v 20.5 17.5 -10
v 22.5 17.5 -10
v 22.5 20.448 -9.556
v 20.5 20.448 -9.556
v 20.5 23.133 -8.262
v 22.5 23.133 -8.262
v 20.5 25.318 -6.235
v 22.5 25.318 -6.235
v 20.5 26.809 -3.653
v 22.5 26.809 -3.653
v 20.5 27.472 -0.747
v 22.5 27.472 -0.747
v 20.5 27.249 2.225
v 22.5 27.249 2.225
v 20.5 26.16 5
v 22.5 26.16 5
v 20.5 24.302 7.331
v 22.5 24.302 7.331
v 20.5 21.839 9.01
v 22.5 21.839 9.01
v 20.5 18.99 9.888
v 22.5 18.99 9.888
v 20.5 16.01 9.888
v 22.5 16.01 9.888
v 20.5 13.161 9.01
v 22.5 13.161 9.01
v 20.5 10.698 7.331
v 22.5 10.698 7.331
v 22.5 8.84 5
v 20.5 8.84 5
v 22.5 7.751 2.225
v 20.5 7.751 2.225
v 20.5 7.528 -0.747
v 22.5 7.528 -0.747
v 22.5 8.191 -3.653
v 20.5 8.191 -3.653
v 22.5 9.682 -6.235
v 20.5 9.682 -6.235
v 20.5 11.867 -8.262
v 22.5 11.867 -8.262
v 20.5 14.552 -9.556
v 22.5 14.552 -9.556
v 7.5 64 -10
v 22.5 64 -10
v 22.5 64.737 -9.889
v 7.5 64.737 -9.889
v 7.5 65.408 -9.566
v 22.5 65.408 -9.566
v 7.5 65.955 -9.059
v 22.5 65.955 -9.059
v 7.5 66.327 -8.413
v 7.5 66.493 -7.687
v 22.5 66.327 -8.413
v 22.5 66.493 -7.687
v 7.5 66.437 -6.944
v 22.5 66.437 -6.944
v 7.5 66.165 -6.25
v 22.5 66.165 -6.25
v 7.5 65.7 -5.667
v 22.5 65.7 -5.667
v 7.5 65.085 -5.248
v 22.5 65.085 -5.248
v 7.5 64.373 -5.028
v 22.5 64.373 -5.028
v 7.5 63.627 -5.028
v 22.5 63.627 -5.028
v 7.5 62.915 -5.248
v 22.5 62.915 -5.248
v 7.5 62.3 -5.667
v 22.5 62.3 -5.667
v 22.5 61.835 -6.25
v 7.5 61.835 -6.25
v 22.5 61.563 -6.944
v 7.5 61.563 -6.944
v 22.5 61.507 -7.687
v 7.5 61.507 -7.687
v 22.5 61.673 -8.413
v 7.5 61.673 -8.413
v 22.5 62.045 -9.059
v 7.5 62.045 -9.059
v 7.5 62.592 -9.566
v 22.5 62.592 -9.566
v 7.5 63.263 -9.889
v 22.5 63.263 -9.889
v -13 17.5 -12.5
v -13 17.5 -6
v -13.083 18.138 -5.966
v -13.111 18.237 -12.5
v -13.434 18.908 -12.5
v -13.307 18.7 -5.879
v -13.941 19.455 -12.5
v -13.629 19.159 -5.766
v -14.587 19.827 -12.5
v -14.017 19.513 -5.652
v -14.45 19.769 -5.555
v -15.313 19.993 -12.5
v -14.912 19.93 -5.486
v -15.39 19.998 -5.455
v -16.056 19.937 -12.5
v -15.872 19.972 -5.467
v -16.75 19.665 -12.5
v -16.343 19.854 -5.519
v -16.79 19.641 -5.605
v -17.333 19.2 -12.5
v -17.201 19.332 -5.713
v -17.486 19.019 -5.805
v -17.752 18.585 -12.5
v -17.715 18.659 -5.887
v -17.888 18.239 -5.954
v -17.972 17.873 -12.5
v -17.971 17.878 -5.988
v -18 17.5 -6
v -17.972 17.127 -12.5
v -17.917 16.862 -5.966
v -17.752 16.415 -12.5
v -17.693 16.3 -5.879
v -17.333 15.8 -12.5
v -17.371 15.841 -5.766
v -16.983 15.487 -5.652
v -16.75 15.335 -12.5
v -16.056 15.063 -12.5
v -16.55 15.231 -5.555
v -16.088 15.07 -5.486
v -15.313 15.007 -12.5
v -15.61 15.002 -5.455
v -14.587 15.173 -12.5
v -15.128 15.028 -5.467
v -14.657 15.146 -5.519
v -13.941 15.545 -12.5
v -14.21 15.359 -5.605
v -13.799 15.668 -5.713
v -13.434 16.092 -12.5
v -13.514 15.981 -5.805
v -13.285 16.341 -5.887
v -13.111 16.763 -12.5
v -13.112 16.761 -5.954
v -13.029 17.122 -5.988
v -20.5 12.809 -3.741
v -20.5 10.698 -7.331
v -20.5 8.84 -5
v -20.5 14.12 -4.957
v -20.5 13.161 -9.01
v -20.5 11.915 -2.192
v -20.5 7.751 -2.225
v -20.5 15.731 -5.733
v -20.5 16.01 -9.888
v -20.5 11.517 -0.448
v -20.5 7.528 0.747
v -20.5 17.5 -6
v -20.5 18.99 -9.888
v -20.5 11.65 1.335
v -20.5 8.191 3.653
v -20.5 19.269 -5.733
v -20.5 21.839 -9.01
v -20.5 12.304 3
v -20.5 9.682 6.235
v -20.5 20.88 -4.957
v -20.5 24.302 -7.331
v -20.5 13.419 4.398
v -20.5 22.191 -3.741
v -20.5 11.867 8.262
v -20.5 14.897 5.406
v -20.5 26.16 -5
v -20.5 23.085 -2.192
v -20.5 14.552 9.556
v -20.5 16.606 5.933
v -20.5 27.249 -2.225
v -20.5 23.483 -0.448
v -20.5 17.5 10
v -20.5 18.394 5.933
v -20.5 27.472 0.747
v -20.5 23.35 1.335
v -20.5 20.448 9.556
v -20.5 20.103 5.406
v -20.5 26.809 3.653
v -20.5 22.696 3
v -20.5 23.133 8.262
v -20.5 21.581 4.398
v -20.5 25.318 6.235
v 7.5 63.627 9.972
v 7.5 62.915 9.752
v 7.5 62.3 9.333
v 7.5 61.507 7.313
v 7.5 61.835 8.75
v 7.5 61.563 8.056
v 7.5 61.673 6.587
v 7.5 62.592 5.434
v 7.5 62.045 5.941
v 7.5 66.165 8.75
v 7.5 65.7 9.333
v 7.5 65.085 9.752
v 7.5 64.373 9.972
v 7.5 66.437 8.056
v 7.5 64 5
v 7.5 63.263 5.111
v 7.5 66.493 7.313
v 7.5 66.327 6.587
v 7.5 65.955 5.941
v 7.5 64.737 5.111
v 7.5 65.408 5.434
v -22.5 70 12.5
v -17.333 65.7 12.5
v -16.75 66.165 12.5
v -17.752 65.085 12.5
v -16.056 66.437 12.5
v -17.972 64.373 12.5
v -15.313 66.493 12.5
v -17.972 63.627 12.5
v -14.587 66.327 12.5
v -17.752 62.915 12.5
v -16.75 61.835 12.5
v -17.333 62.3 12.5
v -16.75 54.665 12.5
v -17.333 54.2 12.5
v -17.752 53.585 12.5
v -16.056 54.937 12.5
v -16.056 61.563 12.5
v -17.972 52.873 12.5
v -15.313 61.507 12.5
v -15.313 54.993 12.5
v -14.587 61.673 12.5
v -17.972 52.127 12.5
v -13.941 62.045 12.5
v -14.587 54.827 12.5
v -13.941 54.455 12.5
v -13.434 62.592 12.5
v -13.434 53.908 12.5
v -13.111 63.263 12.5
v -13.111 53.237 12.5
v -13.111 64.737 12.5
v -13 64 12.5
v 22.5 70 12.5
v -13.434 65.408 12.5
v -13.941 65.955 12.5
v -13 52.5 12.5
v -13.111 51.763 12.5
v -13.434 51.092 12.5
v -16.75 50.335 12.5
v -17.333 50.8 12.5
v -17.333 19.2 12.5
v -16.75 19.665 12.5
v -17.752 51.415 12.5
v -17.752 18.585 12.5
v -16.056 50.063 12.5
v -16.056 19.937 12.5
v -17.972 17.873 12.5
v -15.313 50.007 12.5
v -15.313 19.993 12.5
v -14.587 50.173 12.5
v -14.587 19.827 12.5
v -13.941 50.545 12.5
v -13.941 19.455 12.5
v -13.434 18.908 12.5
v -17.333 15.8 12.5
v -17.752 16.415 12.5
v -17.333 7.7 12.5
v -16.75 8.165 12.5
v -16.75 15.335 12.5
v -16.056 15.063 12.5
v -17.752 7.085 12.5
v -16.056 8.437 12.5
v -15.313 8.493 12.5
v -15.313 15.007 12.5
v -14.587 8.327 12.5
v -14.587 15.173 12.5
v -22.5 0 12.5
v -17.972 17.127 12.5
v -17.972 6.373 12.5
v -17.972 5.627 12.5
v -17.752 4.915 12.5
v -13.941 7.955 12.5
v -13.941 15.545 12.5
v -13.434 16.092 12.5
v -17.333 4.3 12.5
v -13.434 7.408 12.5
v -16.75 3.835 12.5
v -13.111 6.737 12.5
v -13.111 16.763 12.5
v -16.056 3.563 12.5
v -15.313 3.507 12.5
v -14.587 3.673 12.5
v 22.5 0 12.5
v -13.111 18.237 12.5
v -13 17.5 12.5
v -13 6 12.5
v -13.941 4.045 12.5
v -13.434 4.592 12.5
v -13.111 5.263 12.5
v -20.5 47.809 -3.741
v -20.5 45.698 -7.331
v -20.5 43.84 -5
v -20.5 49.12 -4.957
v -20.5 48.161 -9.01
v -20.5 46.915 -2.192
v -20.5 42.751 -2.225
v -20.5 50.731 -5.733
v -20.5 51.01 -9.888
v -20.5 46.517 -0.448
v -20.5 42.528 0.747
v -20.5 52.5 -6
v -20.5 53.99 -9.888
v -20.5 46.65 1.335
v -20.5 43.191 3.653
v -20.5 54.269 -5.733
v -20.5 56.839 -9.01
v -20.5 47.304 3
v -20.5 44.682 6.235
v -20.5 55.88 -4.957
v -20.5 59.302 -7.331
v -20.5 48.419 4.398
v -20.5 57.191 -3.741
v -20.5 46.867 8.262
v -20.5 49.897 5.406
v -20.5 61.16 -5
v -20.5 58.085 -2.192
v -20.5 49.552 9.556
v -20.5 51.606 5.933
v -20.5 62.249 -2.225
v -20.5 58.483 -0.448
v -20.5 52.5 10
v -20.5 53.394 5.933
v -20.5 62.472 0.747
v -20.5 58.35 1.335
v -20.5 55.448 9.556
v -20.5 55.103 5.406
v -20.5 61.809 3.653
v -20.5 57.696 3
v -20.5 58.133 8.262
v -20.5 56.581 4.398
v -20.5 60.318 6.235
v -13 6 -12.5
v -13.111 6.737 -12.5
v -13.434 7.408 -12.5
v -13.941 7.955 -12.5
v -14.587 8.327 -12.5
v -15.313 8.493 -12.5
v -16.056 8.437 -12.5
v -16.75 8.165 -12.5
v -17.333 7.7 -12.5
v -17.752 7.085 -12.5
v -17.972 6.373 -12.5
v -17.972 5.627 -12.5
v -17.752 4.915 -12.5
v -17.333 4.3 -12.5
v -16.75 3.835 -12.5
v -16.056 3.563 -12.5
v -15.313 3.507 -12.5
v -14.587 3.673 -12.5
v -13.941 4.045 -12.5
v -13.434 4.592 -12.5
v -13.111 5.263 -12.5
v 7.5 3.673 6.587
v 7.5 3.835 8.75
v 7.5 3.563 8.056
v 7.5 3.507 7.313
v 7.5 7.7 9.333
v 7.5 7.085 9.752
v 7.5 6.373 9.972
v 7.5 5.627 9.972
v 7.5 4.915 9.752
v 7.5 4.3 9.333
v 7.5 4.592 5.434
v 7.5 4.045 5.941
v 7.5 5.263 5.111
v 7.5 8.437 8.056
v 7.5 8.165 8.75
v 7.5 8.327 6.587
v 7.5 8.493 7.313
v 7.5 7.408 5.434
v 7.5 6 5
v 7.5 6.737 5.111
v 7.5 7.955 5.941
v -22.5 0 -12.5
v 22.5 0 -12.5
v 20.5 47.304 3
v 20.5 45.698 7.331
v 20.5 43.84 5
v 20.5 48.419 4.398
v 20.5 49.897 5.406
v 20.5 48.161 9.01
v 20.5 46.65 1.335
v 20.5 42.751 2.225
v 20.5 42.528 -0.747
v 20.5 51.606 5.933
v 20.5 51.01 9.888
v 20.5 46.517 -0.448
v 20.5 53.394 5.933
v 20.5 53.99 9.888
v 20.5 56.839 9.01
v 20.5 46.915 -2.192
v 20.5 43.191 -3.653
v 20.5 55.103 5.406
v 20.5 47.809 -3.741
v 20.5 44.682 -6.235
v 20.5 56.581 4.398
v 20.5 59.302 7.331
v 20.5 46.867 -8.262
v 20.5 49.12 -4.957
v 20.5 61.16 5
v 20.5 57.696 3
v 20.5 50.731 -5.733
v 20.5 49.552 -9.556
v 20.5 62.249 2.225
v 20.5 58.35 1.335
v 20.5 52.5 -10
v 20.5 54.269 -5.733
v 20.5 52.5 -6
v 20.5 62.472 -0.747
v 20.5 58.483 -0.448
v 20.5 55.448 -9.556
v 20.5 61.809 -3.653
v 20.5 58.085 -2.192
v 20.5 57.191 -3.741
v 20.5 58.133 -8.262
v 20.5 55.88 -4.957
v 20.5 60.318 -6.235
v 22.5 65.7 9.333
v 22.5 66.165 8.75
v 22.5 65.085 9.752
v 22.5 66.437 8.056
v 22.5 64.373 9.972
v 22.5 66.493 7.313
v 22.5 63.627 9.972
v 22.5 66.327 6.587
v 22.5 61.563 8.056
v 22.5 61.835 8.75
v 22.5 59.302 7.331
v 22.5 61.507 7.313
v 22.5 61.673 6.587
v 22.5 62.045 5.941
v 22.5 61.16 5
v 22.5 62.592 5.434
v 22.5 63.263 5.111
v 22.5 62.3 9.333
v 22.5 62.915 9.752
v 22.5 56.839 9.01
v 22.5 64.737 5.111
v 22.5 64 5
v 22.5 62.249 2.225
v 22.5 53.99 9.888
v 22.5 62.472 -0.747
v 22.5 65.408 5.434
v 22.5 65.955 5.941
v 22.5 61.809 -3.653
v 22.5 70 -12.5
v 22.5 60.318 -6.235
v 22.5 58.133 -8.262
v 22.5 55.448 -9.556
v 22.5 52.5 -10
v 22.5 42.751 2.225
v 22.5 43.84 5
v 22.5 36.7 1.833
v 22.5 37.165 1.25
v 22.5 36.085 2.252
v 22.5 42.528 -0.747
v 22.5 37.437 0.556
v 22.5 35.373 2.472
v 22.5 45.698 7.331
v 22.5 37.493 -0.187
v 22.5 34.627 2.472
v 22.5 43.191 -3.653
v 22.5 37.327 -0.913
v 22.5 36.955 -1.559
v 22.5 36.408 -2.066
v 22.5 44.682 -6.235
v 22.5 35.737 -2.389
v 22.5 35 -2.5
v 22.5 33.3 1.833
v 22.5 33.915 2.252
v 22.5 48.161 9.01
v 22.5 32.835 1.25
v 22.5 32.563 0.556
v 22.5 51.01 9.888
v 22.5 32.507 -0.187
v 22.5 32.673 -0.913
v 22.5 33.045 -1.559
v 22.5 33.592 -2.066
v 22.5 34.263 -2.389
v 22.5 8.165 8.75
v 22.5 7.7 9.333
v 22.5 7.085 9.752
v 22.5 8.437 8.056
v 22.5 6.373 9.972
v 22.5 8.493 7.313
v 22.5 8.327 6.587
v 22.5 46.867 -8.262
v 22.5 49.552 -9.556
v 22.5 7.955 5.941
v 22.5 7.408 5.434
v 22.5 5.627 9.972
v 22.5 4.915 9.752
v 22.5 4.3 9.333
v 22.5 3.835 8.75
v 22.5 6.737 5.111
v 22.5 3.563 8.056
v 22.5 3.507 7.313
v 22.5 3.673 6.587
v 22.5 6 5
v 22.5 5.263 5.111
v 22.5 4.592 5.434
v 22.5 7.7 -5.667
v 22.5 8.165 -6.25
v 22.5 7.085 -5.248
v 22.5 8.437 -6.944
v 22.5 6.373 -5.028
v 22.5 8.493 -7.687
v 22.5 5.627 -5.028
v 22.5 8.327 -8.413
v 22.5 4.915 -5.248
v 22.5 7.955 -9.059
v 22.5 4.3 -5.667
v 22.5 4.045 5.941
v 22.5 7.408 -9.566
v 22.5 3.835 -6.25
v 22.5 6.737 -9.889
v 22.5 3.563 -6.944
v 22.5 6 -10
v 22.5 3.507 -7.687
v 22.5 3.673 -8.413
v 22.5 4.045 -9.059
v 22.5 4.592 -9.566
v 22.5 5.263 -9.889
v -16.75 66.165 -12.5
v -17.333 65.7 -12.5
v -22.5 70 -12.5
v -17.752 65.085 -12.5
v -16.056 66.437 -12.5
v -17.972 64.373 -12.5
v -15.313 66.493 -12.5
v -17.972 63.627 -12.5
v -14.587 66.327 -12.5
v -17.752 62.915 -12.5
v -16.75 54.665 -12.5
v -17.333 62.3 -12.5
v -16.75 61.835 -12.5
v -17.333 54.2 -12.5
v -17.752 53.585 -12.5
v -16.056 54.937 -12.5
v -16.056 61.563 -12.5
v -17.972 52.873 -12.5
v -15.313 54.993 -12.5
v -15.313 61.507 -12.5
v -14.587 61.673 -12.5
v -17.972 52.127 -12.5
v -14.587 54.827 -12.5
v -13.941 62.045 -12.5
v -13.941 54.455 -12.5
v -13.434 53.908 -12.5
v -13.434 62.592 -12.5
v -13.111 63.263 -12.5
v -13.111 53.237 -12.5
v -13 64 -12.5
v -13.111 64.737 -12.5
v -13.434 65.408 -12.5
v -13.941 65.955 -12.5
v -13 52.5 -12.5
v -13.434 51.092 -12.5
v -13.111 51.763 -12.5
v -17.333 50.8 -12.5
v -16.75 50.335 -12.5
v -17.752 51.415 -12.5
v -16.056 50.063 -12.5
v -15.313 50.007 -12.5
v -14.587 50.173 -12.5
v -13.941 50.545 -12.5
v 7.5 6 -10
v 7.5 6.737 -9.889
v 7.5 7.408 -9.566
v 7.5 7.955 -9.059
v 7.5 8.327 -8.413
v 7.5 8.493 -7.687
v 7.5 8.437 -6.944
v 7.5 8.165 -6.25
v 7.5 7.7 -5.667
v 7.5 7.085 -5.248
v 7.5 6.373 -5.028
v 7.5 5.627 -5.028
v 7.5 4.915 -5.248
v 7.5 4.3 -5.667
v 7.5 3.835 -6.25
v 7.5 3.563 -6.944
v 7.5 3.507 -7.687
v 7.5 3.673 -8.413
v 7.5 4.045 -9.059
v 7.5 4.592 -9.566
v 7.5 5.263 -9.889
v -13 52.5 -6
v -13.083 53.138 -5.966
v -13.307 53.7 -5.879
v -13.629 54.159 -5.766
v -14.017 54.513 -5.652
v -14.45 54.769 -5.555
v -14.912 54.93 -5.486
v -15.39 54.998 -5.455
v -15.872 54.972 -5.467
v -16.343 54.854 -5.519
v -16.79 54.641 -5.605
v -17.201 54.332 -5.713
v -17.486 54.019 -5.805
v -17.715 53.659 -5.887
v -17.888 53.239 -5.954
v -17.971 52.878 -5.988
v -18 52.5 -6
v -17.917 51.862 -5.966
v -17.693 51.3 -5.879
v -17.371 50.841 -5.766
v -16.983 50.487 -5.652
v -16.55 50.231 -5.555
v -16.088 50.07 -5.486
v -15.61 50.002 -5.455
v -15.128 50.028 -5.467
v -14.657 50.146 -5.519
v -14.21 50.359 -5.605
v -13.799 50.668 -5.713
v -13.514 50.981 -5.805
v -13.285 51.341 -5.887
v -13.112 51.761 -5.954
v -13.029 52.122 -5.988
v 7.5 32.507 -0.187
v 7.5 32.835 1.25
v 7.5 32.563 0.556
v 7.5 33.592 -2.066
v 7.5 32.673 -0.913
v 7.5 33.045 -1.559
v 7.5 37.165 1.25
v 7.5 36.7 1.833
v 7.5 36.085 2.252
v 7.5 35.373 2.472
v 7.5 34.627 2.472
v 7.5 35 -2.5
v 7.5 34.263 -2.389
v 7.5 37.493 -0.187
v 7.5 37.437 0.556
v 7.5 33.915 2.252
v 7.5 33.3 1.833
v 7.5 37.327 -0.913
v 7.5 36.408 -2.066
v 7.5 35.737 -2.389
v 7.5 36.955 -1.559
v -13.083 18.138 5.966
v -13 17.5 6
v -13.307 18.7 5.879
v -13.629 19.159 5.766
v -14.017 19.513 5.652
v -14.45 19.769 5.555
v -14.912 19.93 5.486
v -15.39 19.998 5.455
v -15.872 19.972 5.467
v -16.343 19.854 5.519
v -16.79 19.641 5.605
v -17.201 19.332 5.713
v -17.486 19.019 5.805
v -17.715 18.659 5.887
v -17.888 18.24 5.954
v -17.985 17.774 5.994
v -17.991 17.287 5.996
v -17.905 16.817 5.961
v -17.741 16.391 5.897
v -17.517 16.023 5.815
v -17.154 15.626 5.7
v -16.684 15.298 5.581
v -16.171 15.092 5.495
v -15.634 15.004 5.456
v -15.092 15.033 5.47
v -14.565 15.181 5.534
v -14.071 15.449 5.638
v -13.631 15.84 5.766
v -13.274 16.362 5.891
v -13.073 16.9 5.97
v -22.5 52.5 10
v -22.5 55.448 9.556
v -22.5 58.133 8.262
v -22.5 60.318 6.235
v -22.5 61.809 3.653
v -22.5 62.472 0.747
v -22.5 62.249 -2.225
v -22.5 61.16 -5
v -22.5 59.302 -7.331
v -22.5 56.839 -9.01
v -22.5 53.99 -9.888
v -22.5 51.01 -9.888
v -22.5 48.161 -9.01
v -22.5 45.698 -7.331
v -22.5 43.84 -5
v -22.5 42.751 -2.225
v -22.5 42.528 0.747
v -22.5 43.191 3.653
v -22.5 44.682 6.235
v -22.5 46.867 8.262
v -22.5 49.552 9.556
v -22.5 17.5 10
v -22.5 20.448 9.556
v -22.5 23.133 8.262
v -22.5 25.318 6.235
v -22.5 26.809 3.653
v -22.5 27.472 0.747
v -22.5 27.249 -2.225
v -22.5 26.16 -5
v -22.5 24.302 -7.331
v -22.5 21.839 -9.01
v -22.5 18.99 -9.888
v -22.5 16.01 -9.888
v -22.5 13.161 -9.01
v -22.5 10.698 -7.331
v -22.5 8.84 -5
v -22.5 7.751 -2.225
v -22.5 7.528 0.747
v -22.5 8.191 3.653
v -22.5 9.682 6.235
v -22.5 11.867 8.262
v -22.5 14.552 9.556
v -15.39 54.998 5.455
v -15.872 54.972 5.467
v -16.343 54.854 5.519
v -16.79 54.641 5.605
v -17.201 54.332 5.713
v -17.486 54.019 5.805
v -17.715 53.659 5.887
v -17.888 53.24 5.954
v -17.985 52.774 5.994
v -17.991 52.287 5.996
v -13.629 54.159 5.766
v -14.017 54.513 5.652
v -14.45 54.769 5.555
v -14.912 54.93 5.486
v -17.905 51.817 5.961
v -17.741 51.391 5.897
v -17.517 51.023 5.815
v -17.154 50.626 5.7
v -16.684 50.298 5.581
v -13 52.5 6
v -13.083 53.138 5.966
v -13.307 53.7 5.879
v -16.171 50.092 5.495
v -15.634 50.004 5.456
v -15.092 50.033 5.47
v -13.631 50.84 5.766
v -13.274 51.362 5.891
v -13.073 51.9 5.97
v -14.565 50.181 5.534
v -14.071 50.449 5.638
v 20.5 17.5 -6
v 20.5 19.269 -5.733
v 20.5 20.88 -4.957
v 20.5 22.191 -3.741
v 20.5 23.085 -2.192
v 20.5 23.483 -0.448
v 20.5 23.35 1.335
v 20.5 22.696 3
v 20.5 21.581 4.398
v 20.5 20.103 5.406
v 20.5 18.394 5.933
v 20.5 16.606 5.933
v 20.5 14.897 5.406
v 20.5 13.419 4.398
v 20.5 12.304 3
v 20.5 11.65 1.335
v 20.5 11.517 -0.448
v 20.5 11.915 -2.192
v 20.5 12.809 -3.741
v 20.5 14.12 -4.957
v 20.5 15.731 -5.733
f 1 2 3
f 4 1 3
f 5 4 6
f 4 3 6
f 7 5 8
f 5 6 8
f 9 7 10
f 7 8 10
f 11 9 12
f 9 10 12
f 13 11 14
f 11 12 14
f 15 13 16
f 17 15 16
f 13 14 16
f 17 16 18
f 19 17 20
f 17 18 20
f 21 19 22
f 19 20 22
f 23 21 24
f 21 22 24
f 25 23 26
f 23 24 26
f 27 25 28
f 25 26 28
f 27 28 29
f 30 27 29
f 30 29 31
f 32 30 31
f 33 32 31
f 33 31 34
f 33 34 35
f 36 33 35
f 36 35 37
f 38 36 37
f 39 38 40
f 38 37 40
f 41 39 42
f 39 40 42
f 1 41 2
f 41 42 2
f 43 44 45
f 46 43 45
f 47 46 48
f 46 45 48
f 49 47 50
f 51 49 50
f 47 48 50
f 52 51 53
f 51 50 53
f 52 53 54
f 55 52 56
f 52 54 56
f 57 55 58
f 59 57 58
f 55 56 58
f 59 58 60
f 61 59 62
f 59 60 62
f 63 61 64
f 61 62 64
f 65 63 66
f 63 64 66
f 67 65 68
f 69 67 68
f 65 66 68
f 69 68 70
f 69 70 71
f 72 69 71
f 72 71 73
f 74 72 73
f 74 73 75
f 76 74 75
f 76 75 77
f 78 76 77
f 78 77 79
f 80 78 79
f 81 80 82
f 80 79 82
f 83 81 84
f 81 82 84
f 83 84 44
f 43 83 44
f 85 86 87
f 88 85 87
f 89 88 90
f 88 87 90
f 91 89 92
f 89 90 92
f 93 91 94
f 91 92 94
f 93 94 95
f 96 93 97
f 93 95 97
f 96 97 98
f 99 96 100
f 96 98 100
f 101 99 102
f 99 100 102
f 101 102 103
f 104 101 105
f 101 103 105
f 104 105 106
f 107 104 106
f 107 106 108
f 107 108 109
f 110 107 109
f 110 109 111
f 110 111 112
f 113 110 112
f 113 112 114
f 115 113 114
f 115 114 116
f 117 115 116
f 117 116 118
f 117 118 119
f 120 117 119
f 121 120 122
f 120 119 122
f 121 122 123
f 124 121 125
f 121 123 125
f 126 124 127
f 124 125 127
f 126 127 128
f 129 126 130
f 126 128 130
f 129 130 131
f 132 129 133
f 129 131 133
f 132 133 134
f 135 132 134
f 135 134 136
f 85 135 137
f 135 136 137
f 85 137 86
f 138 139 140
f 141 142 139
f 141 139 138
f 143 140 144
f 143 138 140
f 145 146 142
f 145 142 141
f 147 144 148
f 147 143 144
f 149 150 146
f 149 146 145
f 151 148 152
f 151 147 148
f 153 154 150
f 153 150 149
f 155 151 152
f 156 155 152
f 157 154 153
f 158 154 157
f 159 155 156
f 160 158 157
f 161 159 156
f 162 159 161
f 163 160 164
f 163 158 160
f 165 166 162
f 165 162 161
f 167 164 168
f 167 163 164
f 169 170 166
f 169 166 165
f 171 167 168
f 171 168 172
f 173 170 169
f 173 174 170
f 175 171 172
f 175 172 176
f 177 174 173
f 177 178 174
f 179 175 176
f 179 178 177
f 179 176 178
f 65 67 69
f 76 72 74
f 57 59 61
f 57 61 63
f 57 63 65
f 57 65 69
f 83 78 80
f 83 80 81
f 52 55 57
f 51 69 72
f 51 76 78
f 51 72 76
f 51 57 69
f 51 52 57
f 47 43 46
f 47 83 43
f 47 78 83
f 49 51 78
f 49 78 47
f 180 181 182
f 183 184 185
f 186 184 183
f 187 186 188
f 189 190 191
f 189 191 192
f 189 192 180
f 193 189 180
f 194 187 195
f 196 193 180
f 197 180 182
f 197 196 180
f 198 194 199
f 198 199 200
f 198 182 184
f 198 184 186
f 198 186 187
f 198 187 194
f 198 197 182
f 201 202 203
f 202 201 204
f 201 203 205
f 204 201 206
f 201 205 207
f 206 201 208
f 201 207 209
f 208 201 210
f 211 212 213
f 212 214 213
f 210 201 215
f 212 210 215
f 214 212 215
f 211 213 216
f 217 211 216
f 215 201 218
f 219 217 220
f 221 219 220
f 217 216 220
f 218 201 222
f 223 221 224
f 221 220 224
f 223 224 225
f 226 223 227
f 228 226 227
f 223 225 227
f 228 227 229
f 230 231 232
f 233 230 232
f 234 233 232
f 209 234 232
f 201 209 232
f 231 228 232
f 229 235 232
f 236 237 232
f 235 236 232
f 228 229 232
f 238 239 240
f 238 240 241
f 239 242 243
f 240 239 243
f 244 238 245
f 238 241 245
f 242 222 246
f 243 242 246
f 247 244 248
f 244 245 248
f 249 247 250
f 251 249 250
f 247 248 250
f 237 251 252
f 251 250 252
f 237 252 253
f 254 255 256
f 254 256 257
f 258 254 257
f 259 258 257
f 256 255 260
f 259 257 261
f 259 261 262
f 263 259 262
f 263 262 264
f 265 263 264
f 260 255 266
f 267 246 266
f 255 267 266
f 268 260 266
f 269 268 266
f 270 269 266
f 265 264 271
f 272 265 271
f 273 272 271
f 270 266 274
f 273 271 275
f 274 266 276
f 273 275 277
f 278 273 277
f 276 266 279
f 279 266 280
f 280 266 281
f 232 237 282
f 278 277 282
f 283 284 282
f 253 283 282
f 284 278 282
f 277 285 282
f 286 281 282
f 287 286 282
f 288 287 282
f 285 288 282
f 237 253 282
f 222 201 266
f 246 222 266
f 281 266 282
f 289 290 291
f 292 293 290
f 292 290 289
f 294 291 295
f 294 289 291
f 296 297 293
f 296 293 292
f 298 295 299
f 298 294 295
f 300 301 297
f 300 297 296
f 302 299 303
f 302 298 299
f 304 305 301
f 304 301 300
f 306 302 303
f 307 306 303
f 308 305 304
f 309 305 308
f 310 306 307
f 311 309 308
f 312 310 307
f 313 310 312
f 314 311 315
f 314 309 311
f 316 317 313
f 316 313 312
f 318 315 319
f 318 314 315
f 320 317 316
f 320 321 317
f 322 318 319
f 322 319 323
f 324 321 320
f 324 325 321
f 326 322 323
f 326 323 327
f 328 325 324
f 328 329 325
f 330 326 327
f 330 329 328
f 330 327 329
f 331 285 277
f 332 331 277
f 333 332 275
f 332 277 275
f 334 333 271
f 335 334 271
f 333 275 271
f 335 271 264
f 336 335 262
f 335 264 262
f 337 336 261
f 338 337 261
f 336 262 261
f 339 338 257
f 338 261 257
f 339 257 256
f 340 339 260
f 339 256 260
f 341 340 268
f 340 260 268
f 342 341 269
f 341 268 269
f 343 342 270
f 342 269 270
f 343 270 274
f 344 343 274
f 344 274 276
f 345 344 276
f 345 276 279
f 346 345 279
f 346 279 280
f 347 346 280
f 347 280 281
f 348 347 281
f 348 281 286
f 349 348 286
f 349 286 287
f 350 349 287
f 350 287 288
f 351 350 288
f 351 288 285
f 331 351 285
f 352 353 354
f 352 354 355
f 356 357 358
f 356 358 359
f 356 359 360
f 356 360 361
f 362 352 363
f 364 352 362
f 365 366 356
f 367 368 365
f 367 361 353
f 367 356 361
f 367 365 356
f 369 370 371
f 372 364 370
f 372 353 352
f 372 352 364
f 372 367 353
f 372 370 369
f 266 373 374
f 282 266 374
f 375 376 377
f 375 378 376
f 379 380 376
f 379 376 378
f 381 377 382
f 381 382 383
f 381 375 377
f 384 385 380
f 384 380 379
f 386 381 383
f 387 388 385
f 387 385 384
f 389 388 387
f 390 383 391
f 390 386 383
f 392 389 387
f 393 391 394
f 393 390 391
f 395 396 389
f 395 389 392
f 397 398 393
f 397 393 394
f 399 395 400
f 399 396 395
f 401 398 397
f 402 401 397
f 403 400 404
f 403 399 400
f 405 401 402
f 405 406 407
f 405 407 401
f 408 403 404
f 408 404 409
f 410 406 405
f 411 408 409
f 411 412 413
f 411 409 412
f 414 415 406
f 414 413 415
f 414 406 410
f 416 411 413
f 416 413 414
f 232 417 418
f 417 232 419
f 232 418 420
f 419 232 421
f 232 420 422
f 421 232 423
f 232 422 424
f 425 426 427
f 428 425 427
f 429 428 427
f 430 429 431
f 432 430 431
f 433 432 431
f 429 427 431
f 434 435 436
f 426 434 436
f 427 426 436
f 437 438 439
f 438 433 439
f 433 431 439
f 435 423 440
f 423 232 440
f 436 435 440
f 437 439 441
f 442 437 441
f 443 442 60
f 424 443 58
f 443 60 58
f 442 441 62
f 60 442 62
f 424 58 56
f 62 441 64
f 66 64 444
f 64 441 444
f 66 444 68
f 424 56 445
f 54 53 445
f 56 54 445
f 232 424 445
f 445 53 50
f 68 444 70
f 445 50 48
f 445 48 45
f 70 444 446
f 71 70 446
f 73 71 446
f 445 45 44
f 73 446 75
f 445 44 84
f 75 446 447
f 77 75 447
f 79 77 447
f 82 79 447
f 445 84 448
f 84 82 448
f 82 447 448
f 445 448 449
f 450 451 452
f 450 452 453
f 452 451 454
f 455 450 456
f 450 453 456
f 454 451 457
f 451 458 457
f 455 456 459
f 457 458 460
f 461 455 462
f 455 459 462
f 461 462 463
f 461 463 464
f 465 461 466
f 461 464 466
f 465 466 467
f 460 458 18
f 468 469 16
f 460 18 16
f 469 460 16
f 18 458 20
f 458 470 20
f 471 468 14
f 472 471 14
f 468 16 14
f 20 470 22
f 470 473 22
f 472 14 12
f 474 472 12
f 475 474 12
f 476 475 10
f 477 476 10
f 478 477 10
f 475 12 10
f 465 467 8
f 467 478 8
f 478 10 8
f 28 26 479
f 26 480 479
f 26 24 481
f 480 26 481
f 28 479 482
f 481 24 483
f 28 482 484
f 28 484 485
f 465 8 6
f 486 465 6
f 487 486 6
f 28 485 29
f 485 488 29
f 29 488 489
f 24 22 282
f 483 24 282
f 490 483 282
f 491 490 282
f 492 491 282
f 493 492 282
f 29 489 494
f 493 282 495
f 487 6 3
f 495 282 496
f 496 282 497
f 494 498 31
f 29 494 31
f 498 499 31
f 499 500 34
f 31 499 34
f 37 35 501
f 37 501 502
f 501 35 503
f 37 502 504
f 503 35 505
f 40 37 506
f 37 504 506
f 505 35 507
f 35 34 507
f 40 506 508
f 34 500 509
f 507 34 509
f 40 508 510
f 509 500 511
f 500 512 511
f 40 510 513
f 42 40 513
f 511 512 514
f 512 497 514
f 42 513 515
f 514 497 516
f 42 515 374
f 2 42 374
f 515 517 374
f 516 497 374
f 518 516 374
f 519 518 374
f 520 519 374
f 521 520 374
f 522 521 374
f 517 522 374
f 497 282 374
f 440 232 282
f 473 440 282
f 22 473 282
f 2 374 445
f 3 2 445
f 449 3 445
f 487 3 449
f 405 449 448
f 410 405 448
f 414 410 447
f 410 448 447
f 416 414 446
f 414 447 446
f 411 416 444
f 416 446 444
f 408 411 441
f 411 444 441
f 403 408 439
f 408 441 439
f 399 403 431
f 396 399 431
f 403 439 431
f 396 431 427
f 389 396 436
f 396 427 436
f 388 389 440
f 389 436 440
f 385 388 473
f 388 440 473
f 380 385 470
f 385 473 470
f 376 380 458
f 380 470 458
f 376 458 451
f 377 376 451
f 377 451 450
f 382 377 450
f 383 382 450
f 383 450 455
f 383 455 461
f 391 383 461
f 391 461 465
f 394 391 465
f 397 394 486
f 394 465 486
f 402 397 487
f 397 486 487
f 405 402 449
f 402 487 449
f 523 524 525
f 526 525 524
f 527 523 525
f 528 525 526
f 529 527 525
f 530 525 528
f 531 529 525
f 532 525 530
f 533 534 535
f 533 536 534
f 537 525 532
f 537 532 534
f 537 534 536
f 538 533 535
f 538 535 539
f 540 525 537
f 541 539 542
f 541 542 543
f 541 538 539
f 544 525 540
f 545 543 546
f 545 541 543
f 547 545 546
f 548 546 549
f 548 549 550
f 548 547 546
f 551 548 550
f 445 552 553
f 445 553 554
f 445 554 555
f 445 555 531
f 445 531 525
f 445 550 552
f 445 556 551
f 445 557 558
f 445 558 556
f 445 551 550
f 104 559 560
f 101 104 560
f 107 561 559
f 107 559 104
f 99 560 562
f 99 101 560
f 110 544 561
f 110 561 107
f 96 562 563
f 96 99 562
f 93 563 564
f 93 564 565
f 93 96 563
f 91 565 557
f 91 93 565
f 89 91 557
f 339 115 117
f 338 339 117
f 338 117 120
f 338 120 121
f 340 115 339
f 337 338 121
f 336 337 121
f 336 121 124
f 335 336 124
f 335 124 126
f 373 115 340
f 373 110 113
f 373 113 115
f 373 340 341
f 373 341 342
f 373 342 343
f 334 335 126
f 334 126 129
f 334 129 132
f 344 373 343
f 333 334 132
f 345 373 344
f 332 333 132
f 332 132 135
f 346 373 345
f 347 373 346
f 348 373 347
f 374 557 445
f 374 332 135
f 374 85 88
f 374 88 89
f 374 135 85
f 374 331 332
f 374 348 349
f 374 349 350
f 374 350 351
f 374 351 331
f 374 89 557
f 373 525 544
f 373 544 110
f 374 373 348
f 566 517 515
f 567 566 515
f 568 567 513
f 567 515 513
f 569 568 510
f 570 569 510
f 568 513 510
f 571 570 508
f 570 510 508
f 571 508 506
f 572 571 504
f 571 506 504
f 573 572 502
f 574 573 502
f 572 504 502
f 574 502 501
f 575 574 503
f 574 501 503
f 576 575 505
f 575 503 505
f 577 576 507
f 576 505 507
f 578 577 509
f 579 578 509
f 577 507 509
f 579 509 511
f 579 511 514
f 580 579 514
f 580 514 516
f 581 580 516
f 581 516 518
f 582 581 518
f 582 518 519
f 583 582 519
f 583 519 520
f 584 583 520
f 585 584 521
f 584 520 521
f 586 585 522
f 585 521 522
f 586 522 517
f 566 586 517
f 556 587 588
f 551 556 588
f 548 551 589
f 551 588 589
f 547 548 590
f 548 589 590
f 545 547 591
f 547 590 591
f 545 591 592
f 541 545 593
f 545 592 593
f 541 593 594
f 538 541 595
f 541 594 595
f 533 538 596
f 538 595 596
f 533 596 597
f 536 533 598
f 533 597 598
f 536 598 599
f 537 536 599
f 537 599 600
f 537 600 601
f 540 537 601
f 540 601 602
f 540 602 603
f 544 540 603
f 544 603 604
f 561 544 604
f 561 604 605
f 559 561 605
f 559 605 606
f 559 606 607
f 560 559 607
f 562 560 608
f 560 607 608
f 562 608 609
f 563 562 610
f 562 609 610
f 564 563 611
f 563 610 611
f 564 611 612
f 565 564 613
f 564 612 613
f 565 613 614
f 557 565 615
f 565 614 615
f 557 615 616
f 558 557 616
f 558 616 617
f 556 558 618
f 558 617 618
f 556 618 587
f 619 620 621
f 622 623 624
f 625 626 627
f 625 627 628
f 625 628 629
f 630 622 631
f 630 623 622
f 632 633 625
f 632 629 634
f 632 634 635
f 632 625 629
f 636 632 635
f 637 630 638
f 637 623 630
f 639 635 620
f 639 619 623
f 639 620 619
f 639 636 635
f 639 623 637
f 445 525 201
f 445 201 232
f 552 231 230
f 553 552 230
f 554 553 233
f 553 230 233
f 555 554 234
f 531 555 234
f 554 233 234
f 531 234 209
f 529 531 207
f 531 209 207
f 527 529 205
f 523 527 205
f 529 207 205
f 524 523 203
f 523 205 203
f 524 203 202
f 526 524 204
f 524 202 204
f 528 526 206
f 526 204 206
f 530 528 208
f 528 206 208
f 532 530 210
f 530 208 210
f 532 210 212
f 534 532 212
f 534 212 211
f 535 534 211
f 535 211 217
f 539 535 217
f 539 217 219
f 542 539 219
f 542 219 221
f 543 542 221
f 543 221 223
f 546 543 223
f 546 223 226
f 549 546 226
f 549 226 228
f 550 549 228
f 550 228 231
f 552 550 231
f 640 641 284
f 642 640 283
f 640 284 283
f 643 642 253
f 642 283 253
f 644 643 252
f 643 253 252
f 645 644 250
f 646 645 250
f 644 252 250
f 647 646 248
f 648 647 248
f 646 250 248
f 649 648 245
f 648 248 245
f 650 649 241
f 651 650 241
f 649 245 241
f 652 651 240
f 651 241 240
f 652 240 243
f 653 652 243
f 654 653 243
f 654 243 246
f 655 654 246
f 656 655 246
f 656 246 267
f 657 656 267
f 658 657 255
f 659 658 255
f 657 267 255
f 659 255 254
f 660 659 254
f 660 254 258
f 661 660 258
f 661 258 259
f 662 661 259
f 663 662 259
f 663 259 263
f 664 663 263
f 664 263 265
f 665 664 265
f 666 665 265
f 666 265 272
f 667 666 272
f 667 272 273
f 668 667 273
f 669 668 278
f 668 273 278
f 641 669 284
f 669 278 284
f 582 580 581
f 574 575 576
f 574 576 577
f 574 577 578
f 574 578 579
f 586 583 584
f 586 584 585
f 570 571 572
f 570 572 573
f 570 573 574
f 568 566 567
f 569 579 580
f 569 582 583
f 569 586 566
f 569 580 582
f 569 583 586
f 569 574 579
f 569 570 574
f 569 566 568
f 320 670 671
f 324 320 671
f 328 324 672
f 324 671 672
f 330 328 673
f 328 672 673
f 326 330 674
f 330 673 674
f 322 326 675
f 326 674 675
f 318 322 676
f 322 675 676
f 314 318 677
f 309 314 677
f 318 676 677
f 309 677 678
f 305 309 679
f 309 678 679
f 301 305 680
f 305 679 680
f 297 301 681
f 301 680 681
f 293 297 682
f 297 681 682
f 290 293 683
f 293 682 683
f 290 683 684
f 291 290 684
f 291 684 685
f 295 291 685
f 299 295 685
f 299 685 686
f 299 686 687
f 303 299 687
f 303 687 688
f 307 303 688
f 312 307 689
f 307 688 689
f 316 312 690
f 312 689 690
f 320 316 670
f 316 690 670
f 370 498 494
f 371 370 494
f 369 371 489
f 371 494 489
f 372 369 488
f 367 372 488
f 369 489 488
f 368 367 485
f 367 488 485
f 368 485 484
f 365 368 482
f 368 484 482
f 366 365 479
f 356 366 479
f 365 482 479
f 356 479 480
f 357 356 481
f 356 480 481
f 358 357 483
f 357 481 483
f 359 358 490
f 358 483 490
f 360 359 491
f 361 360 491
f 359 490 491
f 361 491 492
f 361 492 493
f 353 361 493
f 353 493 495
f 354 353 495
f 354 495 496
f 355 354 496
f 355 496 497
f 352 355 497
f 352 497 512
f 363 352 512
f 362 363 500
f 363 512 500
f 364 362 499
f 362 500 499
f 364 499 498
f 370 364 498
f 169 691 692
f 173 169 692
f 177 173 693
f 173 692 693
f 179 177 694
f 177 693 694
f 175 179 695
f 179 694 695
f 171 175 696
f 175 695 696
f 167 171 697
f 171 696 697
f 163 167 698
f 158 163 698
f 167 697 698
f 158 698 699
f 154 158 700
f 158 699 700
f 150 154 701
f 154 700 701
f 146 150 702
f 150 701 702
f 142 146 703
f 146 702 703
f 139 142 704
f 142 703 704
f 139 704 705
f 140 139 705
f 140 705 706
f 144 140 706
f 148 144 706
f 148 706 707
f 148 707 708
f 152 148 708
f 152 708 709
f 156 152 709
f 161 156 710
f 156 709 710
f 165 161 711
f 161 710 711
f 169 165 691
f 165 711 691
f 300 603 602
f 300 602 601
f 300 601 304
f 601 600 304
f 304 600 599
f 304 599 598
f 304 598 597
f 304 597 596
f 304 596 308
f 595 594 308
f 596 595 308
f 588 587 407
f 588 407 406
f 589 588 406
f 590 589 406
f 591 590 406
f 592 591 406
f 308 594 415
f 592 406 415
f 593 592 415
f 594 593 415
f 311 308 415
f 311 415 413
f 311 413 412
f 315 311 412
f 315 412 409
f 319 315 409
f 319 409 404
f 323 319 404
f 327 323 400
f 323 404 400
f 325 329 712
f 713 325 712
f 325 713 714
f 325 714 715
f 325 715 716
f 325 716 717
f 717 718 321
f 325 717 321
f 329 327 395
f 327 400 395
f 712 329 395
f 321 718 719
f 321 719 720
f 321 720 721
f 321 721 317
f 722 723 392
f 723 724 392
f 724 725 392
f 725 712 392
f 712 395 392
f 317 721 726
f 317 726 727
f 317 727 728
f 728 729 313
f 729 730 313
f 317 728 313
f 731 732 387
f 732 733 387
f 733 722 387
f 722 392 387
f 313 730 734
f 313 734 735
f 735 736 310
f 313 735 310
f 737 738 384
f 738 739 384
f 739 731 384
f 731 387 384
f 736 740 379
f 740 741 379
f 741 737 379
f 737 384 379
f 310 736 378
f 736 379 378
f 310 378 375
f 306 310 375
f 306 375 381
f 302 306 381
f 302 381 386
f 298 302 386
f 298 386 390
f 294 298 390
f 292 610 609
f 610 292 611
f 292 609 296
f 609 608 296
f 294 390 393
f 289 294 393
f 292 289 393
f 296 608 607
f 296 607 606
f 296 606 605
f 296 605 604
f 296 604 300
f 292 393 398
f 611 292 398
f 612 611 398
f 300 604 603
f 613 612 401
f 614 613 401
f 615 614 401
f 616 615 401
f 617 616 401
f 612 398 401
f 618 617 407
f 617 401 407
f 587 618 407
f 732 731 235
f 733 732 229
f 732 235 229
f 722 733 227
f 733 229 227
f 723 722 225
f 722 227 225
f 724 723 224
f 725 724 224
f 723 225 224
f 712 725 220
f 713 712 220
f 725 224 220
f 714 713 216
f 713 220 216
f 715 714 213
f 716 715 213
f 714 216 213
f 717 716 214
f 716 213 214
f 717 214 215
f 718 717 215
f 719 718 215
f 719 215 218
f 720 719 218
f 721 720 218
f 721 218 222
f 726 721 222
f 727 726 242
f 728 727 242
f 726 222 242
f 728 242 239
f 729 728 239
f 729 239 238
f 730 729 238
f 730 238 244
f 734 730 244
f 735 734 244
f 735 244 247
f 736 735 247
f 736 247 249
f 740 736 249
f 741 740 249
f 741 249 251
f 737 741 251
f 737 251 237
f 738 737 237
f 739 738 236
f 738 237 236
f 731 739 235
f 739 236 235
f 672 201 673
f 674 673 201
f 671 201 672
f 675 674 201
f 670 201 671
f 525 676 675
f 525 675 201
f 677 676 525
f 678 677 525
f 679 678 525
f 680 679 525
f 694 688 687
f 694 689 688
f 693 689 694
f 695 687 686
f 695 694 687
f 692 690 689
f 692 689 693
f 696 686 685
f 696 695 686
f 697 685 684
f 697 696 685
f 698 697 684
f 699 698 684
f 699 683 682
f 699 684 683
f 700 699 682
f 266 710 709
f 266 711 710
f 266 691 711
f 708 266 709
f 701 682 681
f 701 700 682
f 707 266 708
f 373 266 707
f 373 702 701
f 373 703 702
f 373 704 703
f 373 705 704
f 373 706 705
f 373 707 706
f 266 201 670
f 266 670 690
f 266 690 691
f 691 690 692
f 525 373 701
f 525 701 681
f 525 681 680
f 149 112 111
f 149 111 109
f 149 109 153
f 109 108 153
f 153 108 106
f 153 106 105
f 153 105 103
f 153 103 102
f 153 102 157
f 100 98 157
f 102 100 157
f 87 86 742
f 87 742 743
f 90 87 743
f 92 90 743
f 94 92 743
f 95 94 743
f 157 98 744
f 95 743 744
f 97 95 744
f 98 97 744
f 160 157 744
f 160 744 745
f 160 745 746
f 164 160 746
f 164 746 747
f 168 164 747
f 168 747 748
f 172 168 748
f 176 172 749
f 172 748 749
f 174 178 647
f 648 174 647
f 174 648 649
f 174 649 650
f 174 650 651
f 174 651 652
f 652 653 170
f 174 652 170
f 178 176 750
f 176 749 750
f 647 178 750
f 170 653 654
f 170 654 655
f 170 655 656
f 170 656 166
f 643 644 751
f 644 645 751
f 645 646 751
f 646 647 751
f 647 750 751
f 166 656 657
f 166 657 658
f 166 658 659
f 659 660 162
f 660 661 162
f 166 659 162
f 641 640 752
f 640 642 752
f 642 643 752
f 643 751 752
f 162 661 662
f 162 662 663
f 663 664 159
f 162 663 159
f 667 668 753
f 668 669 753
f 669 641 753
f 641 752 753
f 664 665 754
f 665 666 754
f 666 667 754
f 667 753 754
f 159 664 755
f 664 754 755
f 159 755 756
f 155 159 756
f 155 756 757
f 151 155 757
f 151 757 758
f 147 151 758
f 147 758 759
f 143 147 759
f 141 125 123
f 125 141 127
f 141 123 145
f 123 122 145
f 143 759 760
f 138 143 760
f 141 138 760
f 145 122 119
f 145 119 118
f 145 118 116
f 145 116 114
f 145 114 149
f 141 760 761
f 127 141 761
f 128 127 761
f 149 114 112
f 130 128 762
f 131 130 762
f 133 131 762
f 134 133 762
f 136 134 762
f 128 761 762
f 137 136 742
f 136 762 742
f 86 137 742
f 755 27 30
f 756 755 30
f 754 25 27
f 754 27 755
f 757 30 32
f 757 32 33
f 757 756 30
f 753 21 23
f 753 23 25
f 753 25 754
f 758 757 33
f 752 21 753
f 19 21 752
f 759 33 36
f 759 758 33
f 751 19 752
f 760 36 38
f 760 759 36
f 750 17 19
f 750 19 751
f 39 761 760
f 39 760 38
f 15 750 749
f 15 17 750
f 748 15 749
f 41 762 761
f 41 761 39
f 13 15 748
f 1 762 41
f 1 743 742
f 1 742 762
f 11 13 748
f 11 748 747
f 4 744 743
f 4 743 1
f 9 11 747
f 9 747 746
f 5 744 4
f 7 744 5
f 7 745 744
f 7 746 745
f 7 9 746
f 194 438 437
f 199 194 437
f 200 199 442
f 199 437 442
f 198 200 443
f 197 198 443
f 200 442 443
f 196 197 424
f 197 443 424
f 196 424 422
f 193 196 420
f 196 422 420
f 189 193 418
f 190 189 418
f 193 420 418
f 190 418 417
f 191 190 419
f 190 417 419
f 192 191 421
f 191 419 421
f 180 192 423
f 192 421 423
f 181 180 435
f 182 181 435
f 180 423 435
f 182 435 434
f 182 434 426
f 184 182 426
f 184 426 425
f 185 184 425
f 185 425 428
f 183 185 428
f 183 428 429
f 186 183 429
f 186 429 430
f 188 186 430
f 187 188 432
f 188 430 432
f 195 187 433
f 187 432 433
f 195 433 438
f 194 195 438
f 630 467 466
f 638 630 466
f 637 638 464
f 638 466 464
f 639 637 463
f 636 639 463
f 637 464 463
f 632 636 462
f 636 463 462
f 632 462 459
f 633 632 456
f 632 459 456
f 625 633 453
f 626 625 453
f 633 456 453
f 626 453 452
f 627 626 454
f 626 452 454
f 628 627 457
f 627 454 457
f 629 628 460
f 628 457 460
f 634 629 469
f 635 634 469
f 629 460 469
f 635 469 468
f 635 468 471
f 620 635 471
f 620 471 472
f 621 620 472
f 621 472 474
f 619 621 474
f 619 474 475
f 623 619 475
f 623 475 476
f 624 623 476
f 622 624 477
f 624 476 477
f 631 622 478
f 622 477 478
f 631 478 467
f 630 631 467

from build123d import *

# Parameters (mm, degrees)
SKETCH1_W           = 45
SKETCH1_H           = 25
BOSS_EXTRUDE1_DEPTH = 70
SKETCH2_R           = 6
CUT_EXTRUDE1_DEPTH  = 70
SKETCH3_R           = 10
CUT_EXTRUDE2_DEPTH  = 2
SKETCH4_R           = 10
CUT_EXTRUDE3_DEPTH  = 2
SKETCH5_R           = 2.5
CUT_EXTRUDE4_DEPTH  = 15
SKETCH6_R           = 2.5
CUT_EXTRUDE5_DEPTH  = 15
SKETCH7_R           = 2.5
CUT_EXTRUDE6_DEPTH  = 36
SKETCH8_R           = 2.5
CUT_EXTRUDE7_DEPTH  = 38


with BuildPart() as part:
    # Sketch1 → Boss-Extrude1 (new body)
    with BuildSketch(Plane(origin=(0, 0, 0), x_dir=(1, 0, 0), z_dir=(0, 1, 0))):
        Rectangle(SKETCH1_W, SKETCH1_H)
    extrude(amount=BOSS_EXTRUDE1_DEPTH)

    # Sketch2 → Cut-Extrude1 (cut)
    with BuildSketch(Plane(origin=(22.5, 0, 0), x_dir=(0, 0, -1), z_dir=(1, 0, 0))):
        with Locations((0, 52.5)):
            Circle(SKETCH2_R)
        with Locations((0, 17.5)):
            Circle(SKETCH2_R)
    extrude(amount=-CUT_EXTRUDE1_DEPTH, mode=Mode.SUBTRACT)

    # Sketch3 → Cut-Extrude2 (cut)
    with BuildSketch(Plane(origin=(22.5, 0, 0), x_dir=(0, 0, -1), z_dir=(1, 0, 0))):
        with Locations((0, 17.5)):
            Circle(SKETCH3_R)
        with Locations((0, 52.5)):
            Circle(SKETCH3_R)
    extrude(amount=-CUT_EXTRUDE2_DEPTH, mode=Mode.SUBTRACT)

    # Sketch4 → Cut-Extrude3 (cut)
    with BuildSketch(Plane.ZY.offset(22.5)):
        with Locations((0, 52.5)):
            Circle(SKETCH4_R)
        with Locations((0, 17.5)):
            Circle(SKETCH4_R)
    extrude(amount=-CUT_EXTRUDE3_DEPTH, mode=Mode.SUBTRACT)

    # Sketch5 → Cut-Extrude4 (cut)
    with BuildSketch(Plane(origin=(22.5, 0, 0), x_dir=(0, 0, -1), z_dir=(1, 0, 0))):
        with Locations((7.5, 6)):
            Circle(SKETCH5_R)
        with Locations((-7.5, 6)):
            Circle(SKETCH5_R)
        with Locations((7.5, 64)):
            Circle(SKETCH5_R)
        with Locations((-7.5, 64)):
            Circle(SKETCH5_R)
    extrude(amount=-CUT_EXTRUDE4_DEPTH, mode=Mode.SUBTRACT)

    # Sketch6 → Cut-Extrude5 (cut)
    with BuildSketch(Plane(origin=(22.5, 0, 0), x_dir=(0, 0, -1), z_dir=(1, 0, 0))):
        with Locations((0, 35)):
            Circle(SKETCH6_R)
    extrude(amount=-CUT_EXTRUDE5_DEPTH, mode=Mode.SUBTRACT)

    # Sketch7 → Cut-Extrude6 (cut)
    with BuildSketch(Plane.XY.offset(12.5)):
        with Locations((-15.5, 52.5)):
            Circle(SKETCH7_R)
        with Locations((-15.5, 17.5)):
            Circle(SKETCH7_R)
    extrude(amount=-CUT_EXTRUDE6_DEPTH, mode=Mode.SUBTRACT)

    # Sketch8 → Cut-Extrude7 (cut)
    with BuildSketch(Plane.XY.offset(12.5)):
        with Locations((-15.5, 64)):
            Circle(SKETCH8_R)
        with Locations((-15.5, 6)):
            Circle(SKETCH8_R)
    extrude(amount=-CUT_EXTRUDE7_DEPTH, mode=Mode.SUBTRACT)


solid = part.part
